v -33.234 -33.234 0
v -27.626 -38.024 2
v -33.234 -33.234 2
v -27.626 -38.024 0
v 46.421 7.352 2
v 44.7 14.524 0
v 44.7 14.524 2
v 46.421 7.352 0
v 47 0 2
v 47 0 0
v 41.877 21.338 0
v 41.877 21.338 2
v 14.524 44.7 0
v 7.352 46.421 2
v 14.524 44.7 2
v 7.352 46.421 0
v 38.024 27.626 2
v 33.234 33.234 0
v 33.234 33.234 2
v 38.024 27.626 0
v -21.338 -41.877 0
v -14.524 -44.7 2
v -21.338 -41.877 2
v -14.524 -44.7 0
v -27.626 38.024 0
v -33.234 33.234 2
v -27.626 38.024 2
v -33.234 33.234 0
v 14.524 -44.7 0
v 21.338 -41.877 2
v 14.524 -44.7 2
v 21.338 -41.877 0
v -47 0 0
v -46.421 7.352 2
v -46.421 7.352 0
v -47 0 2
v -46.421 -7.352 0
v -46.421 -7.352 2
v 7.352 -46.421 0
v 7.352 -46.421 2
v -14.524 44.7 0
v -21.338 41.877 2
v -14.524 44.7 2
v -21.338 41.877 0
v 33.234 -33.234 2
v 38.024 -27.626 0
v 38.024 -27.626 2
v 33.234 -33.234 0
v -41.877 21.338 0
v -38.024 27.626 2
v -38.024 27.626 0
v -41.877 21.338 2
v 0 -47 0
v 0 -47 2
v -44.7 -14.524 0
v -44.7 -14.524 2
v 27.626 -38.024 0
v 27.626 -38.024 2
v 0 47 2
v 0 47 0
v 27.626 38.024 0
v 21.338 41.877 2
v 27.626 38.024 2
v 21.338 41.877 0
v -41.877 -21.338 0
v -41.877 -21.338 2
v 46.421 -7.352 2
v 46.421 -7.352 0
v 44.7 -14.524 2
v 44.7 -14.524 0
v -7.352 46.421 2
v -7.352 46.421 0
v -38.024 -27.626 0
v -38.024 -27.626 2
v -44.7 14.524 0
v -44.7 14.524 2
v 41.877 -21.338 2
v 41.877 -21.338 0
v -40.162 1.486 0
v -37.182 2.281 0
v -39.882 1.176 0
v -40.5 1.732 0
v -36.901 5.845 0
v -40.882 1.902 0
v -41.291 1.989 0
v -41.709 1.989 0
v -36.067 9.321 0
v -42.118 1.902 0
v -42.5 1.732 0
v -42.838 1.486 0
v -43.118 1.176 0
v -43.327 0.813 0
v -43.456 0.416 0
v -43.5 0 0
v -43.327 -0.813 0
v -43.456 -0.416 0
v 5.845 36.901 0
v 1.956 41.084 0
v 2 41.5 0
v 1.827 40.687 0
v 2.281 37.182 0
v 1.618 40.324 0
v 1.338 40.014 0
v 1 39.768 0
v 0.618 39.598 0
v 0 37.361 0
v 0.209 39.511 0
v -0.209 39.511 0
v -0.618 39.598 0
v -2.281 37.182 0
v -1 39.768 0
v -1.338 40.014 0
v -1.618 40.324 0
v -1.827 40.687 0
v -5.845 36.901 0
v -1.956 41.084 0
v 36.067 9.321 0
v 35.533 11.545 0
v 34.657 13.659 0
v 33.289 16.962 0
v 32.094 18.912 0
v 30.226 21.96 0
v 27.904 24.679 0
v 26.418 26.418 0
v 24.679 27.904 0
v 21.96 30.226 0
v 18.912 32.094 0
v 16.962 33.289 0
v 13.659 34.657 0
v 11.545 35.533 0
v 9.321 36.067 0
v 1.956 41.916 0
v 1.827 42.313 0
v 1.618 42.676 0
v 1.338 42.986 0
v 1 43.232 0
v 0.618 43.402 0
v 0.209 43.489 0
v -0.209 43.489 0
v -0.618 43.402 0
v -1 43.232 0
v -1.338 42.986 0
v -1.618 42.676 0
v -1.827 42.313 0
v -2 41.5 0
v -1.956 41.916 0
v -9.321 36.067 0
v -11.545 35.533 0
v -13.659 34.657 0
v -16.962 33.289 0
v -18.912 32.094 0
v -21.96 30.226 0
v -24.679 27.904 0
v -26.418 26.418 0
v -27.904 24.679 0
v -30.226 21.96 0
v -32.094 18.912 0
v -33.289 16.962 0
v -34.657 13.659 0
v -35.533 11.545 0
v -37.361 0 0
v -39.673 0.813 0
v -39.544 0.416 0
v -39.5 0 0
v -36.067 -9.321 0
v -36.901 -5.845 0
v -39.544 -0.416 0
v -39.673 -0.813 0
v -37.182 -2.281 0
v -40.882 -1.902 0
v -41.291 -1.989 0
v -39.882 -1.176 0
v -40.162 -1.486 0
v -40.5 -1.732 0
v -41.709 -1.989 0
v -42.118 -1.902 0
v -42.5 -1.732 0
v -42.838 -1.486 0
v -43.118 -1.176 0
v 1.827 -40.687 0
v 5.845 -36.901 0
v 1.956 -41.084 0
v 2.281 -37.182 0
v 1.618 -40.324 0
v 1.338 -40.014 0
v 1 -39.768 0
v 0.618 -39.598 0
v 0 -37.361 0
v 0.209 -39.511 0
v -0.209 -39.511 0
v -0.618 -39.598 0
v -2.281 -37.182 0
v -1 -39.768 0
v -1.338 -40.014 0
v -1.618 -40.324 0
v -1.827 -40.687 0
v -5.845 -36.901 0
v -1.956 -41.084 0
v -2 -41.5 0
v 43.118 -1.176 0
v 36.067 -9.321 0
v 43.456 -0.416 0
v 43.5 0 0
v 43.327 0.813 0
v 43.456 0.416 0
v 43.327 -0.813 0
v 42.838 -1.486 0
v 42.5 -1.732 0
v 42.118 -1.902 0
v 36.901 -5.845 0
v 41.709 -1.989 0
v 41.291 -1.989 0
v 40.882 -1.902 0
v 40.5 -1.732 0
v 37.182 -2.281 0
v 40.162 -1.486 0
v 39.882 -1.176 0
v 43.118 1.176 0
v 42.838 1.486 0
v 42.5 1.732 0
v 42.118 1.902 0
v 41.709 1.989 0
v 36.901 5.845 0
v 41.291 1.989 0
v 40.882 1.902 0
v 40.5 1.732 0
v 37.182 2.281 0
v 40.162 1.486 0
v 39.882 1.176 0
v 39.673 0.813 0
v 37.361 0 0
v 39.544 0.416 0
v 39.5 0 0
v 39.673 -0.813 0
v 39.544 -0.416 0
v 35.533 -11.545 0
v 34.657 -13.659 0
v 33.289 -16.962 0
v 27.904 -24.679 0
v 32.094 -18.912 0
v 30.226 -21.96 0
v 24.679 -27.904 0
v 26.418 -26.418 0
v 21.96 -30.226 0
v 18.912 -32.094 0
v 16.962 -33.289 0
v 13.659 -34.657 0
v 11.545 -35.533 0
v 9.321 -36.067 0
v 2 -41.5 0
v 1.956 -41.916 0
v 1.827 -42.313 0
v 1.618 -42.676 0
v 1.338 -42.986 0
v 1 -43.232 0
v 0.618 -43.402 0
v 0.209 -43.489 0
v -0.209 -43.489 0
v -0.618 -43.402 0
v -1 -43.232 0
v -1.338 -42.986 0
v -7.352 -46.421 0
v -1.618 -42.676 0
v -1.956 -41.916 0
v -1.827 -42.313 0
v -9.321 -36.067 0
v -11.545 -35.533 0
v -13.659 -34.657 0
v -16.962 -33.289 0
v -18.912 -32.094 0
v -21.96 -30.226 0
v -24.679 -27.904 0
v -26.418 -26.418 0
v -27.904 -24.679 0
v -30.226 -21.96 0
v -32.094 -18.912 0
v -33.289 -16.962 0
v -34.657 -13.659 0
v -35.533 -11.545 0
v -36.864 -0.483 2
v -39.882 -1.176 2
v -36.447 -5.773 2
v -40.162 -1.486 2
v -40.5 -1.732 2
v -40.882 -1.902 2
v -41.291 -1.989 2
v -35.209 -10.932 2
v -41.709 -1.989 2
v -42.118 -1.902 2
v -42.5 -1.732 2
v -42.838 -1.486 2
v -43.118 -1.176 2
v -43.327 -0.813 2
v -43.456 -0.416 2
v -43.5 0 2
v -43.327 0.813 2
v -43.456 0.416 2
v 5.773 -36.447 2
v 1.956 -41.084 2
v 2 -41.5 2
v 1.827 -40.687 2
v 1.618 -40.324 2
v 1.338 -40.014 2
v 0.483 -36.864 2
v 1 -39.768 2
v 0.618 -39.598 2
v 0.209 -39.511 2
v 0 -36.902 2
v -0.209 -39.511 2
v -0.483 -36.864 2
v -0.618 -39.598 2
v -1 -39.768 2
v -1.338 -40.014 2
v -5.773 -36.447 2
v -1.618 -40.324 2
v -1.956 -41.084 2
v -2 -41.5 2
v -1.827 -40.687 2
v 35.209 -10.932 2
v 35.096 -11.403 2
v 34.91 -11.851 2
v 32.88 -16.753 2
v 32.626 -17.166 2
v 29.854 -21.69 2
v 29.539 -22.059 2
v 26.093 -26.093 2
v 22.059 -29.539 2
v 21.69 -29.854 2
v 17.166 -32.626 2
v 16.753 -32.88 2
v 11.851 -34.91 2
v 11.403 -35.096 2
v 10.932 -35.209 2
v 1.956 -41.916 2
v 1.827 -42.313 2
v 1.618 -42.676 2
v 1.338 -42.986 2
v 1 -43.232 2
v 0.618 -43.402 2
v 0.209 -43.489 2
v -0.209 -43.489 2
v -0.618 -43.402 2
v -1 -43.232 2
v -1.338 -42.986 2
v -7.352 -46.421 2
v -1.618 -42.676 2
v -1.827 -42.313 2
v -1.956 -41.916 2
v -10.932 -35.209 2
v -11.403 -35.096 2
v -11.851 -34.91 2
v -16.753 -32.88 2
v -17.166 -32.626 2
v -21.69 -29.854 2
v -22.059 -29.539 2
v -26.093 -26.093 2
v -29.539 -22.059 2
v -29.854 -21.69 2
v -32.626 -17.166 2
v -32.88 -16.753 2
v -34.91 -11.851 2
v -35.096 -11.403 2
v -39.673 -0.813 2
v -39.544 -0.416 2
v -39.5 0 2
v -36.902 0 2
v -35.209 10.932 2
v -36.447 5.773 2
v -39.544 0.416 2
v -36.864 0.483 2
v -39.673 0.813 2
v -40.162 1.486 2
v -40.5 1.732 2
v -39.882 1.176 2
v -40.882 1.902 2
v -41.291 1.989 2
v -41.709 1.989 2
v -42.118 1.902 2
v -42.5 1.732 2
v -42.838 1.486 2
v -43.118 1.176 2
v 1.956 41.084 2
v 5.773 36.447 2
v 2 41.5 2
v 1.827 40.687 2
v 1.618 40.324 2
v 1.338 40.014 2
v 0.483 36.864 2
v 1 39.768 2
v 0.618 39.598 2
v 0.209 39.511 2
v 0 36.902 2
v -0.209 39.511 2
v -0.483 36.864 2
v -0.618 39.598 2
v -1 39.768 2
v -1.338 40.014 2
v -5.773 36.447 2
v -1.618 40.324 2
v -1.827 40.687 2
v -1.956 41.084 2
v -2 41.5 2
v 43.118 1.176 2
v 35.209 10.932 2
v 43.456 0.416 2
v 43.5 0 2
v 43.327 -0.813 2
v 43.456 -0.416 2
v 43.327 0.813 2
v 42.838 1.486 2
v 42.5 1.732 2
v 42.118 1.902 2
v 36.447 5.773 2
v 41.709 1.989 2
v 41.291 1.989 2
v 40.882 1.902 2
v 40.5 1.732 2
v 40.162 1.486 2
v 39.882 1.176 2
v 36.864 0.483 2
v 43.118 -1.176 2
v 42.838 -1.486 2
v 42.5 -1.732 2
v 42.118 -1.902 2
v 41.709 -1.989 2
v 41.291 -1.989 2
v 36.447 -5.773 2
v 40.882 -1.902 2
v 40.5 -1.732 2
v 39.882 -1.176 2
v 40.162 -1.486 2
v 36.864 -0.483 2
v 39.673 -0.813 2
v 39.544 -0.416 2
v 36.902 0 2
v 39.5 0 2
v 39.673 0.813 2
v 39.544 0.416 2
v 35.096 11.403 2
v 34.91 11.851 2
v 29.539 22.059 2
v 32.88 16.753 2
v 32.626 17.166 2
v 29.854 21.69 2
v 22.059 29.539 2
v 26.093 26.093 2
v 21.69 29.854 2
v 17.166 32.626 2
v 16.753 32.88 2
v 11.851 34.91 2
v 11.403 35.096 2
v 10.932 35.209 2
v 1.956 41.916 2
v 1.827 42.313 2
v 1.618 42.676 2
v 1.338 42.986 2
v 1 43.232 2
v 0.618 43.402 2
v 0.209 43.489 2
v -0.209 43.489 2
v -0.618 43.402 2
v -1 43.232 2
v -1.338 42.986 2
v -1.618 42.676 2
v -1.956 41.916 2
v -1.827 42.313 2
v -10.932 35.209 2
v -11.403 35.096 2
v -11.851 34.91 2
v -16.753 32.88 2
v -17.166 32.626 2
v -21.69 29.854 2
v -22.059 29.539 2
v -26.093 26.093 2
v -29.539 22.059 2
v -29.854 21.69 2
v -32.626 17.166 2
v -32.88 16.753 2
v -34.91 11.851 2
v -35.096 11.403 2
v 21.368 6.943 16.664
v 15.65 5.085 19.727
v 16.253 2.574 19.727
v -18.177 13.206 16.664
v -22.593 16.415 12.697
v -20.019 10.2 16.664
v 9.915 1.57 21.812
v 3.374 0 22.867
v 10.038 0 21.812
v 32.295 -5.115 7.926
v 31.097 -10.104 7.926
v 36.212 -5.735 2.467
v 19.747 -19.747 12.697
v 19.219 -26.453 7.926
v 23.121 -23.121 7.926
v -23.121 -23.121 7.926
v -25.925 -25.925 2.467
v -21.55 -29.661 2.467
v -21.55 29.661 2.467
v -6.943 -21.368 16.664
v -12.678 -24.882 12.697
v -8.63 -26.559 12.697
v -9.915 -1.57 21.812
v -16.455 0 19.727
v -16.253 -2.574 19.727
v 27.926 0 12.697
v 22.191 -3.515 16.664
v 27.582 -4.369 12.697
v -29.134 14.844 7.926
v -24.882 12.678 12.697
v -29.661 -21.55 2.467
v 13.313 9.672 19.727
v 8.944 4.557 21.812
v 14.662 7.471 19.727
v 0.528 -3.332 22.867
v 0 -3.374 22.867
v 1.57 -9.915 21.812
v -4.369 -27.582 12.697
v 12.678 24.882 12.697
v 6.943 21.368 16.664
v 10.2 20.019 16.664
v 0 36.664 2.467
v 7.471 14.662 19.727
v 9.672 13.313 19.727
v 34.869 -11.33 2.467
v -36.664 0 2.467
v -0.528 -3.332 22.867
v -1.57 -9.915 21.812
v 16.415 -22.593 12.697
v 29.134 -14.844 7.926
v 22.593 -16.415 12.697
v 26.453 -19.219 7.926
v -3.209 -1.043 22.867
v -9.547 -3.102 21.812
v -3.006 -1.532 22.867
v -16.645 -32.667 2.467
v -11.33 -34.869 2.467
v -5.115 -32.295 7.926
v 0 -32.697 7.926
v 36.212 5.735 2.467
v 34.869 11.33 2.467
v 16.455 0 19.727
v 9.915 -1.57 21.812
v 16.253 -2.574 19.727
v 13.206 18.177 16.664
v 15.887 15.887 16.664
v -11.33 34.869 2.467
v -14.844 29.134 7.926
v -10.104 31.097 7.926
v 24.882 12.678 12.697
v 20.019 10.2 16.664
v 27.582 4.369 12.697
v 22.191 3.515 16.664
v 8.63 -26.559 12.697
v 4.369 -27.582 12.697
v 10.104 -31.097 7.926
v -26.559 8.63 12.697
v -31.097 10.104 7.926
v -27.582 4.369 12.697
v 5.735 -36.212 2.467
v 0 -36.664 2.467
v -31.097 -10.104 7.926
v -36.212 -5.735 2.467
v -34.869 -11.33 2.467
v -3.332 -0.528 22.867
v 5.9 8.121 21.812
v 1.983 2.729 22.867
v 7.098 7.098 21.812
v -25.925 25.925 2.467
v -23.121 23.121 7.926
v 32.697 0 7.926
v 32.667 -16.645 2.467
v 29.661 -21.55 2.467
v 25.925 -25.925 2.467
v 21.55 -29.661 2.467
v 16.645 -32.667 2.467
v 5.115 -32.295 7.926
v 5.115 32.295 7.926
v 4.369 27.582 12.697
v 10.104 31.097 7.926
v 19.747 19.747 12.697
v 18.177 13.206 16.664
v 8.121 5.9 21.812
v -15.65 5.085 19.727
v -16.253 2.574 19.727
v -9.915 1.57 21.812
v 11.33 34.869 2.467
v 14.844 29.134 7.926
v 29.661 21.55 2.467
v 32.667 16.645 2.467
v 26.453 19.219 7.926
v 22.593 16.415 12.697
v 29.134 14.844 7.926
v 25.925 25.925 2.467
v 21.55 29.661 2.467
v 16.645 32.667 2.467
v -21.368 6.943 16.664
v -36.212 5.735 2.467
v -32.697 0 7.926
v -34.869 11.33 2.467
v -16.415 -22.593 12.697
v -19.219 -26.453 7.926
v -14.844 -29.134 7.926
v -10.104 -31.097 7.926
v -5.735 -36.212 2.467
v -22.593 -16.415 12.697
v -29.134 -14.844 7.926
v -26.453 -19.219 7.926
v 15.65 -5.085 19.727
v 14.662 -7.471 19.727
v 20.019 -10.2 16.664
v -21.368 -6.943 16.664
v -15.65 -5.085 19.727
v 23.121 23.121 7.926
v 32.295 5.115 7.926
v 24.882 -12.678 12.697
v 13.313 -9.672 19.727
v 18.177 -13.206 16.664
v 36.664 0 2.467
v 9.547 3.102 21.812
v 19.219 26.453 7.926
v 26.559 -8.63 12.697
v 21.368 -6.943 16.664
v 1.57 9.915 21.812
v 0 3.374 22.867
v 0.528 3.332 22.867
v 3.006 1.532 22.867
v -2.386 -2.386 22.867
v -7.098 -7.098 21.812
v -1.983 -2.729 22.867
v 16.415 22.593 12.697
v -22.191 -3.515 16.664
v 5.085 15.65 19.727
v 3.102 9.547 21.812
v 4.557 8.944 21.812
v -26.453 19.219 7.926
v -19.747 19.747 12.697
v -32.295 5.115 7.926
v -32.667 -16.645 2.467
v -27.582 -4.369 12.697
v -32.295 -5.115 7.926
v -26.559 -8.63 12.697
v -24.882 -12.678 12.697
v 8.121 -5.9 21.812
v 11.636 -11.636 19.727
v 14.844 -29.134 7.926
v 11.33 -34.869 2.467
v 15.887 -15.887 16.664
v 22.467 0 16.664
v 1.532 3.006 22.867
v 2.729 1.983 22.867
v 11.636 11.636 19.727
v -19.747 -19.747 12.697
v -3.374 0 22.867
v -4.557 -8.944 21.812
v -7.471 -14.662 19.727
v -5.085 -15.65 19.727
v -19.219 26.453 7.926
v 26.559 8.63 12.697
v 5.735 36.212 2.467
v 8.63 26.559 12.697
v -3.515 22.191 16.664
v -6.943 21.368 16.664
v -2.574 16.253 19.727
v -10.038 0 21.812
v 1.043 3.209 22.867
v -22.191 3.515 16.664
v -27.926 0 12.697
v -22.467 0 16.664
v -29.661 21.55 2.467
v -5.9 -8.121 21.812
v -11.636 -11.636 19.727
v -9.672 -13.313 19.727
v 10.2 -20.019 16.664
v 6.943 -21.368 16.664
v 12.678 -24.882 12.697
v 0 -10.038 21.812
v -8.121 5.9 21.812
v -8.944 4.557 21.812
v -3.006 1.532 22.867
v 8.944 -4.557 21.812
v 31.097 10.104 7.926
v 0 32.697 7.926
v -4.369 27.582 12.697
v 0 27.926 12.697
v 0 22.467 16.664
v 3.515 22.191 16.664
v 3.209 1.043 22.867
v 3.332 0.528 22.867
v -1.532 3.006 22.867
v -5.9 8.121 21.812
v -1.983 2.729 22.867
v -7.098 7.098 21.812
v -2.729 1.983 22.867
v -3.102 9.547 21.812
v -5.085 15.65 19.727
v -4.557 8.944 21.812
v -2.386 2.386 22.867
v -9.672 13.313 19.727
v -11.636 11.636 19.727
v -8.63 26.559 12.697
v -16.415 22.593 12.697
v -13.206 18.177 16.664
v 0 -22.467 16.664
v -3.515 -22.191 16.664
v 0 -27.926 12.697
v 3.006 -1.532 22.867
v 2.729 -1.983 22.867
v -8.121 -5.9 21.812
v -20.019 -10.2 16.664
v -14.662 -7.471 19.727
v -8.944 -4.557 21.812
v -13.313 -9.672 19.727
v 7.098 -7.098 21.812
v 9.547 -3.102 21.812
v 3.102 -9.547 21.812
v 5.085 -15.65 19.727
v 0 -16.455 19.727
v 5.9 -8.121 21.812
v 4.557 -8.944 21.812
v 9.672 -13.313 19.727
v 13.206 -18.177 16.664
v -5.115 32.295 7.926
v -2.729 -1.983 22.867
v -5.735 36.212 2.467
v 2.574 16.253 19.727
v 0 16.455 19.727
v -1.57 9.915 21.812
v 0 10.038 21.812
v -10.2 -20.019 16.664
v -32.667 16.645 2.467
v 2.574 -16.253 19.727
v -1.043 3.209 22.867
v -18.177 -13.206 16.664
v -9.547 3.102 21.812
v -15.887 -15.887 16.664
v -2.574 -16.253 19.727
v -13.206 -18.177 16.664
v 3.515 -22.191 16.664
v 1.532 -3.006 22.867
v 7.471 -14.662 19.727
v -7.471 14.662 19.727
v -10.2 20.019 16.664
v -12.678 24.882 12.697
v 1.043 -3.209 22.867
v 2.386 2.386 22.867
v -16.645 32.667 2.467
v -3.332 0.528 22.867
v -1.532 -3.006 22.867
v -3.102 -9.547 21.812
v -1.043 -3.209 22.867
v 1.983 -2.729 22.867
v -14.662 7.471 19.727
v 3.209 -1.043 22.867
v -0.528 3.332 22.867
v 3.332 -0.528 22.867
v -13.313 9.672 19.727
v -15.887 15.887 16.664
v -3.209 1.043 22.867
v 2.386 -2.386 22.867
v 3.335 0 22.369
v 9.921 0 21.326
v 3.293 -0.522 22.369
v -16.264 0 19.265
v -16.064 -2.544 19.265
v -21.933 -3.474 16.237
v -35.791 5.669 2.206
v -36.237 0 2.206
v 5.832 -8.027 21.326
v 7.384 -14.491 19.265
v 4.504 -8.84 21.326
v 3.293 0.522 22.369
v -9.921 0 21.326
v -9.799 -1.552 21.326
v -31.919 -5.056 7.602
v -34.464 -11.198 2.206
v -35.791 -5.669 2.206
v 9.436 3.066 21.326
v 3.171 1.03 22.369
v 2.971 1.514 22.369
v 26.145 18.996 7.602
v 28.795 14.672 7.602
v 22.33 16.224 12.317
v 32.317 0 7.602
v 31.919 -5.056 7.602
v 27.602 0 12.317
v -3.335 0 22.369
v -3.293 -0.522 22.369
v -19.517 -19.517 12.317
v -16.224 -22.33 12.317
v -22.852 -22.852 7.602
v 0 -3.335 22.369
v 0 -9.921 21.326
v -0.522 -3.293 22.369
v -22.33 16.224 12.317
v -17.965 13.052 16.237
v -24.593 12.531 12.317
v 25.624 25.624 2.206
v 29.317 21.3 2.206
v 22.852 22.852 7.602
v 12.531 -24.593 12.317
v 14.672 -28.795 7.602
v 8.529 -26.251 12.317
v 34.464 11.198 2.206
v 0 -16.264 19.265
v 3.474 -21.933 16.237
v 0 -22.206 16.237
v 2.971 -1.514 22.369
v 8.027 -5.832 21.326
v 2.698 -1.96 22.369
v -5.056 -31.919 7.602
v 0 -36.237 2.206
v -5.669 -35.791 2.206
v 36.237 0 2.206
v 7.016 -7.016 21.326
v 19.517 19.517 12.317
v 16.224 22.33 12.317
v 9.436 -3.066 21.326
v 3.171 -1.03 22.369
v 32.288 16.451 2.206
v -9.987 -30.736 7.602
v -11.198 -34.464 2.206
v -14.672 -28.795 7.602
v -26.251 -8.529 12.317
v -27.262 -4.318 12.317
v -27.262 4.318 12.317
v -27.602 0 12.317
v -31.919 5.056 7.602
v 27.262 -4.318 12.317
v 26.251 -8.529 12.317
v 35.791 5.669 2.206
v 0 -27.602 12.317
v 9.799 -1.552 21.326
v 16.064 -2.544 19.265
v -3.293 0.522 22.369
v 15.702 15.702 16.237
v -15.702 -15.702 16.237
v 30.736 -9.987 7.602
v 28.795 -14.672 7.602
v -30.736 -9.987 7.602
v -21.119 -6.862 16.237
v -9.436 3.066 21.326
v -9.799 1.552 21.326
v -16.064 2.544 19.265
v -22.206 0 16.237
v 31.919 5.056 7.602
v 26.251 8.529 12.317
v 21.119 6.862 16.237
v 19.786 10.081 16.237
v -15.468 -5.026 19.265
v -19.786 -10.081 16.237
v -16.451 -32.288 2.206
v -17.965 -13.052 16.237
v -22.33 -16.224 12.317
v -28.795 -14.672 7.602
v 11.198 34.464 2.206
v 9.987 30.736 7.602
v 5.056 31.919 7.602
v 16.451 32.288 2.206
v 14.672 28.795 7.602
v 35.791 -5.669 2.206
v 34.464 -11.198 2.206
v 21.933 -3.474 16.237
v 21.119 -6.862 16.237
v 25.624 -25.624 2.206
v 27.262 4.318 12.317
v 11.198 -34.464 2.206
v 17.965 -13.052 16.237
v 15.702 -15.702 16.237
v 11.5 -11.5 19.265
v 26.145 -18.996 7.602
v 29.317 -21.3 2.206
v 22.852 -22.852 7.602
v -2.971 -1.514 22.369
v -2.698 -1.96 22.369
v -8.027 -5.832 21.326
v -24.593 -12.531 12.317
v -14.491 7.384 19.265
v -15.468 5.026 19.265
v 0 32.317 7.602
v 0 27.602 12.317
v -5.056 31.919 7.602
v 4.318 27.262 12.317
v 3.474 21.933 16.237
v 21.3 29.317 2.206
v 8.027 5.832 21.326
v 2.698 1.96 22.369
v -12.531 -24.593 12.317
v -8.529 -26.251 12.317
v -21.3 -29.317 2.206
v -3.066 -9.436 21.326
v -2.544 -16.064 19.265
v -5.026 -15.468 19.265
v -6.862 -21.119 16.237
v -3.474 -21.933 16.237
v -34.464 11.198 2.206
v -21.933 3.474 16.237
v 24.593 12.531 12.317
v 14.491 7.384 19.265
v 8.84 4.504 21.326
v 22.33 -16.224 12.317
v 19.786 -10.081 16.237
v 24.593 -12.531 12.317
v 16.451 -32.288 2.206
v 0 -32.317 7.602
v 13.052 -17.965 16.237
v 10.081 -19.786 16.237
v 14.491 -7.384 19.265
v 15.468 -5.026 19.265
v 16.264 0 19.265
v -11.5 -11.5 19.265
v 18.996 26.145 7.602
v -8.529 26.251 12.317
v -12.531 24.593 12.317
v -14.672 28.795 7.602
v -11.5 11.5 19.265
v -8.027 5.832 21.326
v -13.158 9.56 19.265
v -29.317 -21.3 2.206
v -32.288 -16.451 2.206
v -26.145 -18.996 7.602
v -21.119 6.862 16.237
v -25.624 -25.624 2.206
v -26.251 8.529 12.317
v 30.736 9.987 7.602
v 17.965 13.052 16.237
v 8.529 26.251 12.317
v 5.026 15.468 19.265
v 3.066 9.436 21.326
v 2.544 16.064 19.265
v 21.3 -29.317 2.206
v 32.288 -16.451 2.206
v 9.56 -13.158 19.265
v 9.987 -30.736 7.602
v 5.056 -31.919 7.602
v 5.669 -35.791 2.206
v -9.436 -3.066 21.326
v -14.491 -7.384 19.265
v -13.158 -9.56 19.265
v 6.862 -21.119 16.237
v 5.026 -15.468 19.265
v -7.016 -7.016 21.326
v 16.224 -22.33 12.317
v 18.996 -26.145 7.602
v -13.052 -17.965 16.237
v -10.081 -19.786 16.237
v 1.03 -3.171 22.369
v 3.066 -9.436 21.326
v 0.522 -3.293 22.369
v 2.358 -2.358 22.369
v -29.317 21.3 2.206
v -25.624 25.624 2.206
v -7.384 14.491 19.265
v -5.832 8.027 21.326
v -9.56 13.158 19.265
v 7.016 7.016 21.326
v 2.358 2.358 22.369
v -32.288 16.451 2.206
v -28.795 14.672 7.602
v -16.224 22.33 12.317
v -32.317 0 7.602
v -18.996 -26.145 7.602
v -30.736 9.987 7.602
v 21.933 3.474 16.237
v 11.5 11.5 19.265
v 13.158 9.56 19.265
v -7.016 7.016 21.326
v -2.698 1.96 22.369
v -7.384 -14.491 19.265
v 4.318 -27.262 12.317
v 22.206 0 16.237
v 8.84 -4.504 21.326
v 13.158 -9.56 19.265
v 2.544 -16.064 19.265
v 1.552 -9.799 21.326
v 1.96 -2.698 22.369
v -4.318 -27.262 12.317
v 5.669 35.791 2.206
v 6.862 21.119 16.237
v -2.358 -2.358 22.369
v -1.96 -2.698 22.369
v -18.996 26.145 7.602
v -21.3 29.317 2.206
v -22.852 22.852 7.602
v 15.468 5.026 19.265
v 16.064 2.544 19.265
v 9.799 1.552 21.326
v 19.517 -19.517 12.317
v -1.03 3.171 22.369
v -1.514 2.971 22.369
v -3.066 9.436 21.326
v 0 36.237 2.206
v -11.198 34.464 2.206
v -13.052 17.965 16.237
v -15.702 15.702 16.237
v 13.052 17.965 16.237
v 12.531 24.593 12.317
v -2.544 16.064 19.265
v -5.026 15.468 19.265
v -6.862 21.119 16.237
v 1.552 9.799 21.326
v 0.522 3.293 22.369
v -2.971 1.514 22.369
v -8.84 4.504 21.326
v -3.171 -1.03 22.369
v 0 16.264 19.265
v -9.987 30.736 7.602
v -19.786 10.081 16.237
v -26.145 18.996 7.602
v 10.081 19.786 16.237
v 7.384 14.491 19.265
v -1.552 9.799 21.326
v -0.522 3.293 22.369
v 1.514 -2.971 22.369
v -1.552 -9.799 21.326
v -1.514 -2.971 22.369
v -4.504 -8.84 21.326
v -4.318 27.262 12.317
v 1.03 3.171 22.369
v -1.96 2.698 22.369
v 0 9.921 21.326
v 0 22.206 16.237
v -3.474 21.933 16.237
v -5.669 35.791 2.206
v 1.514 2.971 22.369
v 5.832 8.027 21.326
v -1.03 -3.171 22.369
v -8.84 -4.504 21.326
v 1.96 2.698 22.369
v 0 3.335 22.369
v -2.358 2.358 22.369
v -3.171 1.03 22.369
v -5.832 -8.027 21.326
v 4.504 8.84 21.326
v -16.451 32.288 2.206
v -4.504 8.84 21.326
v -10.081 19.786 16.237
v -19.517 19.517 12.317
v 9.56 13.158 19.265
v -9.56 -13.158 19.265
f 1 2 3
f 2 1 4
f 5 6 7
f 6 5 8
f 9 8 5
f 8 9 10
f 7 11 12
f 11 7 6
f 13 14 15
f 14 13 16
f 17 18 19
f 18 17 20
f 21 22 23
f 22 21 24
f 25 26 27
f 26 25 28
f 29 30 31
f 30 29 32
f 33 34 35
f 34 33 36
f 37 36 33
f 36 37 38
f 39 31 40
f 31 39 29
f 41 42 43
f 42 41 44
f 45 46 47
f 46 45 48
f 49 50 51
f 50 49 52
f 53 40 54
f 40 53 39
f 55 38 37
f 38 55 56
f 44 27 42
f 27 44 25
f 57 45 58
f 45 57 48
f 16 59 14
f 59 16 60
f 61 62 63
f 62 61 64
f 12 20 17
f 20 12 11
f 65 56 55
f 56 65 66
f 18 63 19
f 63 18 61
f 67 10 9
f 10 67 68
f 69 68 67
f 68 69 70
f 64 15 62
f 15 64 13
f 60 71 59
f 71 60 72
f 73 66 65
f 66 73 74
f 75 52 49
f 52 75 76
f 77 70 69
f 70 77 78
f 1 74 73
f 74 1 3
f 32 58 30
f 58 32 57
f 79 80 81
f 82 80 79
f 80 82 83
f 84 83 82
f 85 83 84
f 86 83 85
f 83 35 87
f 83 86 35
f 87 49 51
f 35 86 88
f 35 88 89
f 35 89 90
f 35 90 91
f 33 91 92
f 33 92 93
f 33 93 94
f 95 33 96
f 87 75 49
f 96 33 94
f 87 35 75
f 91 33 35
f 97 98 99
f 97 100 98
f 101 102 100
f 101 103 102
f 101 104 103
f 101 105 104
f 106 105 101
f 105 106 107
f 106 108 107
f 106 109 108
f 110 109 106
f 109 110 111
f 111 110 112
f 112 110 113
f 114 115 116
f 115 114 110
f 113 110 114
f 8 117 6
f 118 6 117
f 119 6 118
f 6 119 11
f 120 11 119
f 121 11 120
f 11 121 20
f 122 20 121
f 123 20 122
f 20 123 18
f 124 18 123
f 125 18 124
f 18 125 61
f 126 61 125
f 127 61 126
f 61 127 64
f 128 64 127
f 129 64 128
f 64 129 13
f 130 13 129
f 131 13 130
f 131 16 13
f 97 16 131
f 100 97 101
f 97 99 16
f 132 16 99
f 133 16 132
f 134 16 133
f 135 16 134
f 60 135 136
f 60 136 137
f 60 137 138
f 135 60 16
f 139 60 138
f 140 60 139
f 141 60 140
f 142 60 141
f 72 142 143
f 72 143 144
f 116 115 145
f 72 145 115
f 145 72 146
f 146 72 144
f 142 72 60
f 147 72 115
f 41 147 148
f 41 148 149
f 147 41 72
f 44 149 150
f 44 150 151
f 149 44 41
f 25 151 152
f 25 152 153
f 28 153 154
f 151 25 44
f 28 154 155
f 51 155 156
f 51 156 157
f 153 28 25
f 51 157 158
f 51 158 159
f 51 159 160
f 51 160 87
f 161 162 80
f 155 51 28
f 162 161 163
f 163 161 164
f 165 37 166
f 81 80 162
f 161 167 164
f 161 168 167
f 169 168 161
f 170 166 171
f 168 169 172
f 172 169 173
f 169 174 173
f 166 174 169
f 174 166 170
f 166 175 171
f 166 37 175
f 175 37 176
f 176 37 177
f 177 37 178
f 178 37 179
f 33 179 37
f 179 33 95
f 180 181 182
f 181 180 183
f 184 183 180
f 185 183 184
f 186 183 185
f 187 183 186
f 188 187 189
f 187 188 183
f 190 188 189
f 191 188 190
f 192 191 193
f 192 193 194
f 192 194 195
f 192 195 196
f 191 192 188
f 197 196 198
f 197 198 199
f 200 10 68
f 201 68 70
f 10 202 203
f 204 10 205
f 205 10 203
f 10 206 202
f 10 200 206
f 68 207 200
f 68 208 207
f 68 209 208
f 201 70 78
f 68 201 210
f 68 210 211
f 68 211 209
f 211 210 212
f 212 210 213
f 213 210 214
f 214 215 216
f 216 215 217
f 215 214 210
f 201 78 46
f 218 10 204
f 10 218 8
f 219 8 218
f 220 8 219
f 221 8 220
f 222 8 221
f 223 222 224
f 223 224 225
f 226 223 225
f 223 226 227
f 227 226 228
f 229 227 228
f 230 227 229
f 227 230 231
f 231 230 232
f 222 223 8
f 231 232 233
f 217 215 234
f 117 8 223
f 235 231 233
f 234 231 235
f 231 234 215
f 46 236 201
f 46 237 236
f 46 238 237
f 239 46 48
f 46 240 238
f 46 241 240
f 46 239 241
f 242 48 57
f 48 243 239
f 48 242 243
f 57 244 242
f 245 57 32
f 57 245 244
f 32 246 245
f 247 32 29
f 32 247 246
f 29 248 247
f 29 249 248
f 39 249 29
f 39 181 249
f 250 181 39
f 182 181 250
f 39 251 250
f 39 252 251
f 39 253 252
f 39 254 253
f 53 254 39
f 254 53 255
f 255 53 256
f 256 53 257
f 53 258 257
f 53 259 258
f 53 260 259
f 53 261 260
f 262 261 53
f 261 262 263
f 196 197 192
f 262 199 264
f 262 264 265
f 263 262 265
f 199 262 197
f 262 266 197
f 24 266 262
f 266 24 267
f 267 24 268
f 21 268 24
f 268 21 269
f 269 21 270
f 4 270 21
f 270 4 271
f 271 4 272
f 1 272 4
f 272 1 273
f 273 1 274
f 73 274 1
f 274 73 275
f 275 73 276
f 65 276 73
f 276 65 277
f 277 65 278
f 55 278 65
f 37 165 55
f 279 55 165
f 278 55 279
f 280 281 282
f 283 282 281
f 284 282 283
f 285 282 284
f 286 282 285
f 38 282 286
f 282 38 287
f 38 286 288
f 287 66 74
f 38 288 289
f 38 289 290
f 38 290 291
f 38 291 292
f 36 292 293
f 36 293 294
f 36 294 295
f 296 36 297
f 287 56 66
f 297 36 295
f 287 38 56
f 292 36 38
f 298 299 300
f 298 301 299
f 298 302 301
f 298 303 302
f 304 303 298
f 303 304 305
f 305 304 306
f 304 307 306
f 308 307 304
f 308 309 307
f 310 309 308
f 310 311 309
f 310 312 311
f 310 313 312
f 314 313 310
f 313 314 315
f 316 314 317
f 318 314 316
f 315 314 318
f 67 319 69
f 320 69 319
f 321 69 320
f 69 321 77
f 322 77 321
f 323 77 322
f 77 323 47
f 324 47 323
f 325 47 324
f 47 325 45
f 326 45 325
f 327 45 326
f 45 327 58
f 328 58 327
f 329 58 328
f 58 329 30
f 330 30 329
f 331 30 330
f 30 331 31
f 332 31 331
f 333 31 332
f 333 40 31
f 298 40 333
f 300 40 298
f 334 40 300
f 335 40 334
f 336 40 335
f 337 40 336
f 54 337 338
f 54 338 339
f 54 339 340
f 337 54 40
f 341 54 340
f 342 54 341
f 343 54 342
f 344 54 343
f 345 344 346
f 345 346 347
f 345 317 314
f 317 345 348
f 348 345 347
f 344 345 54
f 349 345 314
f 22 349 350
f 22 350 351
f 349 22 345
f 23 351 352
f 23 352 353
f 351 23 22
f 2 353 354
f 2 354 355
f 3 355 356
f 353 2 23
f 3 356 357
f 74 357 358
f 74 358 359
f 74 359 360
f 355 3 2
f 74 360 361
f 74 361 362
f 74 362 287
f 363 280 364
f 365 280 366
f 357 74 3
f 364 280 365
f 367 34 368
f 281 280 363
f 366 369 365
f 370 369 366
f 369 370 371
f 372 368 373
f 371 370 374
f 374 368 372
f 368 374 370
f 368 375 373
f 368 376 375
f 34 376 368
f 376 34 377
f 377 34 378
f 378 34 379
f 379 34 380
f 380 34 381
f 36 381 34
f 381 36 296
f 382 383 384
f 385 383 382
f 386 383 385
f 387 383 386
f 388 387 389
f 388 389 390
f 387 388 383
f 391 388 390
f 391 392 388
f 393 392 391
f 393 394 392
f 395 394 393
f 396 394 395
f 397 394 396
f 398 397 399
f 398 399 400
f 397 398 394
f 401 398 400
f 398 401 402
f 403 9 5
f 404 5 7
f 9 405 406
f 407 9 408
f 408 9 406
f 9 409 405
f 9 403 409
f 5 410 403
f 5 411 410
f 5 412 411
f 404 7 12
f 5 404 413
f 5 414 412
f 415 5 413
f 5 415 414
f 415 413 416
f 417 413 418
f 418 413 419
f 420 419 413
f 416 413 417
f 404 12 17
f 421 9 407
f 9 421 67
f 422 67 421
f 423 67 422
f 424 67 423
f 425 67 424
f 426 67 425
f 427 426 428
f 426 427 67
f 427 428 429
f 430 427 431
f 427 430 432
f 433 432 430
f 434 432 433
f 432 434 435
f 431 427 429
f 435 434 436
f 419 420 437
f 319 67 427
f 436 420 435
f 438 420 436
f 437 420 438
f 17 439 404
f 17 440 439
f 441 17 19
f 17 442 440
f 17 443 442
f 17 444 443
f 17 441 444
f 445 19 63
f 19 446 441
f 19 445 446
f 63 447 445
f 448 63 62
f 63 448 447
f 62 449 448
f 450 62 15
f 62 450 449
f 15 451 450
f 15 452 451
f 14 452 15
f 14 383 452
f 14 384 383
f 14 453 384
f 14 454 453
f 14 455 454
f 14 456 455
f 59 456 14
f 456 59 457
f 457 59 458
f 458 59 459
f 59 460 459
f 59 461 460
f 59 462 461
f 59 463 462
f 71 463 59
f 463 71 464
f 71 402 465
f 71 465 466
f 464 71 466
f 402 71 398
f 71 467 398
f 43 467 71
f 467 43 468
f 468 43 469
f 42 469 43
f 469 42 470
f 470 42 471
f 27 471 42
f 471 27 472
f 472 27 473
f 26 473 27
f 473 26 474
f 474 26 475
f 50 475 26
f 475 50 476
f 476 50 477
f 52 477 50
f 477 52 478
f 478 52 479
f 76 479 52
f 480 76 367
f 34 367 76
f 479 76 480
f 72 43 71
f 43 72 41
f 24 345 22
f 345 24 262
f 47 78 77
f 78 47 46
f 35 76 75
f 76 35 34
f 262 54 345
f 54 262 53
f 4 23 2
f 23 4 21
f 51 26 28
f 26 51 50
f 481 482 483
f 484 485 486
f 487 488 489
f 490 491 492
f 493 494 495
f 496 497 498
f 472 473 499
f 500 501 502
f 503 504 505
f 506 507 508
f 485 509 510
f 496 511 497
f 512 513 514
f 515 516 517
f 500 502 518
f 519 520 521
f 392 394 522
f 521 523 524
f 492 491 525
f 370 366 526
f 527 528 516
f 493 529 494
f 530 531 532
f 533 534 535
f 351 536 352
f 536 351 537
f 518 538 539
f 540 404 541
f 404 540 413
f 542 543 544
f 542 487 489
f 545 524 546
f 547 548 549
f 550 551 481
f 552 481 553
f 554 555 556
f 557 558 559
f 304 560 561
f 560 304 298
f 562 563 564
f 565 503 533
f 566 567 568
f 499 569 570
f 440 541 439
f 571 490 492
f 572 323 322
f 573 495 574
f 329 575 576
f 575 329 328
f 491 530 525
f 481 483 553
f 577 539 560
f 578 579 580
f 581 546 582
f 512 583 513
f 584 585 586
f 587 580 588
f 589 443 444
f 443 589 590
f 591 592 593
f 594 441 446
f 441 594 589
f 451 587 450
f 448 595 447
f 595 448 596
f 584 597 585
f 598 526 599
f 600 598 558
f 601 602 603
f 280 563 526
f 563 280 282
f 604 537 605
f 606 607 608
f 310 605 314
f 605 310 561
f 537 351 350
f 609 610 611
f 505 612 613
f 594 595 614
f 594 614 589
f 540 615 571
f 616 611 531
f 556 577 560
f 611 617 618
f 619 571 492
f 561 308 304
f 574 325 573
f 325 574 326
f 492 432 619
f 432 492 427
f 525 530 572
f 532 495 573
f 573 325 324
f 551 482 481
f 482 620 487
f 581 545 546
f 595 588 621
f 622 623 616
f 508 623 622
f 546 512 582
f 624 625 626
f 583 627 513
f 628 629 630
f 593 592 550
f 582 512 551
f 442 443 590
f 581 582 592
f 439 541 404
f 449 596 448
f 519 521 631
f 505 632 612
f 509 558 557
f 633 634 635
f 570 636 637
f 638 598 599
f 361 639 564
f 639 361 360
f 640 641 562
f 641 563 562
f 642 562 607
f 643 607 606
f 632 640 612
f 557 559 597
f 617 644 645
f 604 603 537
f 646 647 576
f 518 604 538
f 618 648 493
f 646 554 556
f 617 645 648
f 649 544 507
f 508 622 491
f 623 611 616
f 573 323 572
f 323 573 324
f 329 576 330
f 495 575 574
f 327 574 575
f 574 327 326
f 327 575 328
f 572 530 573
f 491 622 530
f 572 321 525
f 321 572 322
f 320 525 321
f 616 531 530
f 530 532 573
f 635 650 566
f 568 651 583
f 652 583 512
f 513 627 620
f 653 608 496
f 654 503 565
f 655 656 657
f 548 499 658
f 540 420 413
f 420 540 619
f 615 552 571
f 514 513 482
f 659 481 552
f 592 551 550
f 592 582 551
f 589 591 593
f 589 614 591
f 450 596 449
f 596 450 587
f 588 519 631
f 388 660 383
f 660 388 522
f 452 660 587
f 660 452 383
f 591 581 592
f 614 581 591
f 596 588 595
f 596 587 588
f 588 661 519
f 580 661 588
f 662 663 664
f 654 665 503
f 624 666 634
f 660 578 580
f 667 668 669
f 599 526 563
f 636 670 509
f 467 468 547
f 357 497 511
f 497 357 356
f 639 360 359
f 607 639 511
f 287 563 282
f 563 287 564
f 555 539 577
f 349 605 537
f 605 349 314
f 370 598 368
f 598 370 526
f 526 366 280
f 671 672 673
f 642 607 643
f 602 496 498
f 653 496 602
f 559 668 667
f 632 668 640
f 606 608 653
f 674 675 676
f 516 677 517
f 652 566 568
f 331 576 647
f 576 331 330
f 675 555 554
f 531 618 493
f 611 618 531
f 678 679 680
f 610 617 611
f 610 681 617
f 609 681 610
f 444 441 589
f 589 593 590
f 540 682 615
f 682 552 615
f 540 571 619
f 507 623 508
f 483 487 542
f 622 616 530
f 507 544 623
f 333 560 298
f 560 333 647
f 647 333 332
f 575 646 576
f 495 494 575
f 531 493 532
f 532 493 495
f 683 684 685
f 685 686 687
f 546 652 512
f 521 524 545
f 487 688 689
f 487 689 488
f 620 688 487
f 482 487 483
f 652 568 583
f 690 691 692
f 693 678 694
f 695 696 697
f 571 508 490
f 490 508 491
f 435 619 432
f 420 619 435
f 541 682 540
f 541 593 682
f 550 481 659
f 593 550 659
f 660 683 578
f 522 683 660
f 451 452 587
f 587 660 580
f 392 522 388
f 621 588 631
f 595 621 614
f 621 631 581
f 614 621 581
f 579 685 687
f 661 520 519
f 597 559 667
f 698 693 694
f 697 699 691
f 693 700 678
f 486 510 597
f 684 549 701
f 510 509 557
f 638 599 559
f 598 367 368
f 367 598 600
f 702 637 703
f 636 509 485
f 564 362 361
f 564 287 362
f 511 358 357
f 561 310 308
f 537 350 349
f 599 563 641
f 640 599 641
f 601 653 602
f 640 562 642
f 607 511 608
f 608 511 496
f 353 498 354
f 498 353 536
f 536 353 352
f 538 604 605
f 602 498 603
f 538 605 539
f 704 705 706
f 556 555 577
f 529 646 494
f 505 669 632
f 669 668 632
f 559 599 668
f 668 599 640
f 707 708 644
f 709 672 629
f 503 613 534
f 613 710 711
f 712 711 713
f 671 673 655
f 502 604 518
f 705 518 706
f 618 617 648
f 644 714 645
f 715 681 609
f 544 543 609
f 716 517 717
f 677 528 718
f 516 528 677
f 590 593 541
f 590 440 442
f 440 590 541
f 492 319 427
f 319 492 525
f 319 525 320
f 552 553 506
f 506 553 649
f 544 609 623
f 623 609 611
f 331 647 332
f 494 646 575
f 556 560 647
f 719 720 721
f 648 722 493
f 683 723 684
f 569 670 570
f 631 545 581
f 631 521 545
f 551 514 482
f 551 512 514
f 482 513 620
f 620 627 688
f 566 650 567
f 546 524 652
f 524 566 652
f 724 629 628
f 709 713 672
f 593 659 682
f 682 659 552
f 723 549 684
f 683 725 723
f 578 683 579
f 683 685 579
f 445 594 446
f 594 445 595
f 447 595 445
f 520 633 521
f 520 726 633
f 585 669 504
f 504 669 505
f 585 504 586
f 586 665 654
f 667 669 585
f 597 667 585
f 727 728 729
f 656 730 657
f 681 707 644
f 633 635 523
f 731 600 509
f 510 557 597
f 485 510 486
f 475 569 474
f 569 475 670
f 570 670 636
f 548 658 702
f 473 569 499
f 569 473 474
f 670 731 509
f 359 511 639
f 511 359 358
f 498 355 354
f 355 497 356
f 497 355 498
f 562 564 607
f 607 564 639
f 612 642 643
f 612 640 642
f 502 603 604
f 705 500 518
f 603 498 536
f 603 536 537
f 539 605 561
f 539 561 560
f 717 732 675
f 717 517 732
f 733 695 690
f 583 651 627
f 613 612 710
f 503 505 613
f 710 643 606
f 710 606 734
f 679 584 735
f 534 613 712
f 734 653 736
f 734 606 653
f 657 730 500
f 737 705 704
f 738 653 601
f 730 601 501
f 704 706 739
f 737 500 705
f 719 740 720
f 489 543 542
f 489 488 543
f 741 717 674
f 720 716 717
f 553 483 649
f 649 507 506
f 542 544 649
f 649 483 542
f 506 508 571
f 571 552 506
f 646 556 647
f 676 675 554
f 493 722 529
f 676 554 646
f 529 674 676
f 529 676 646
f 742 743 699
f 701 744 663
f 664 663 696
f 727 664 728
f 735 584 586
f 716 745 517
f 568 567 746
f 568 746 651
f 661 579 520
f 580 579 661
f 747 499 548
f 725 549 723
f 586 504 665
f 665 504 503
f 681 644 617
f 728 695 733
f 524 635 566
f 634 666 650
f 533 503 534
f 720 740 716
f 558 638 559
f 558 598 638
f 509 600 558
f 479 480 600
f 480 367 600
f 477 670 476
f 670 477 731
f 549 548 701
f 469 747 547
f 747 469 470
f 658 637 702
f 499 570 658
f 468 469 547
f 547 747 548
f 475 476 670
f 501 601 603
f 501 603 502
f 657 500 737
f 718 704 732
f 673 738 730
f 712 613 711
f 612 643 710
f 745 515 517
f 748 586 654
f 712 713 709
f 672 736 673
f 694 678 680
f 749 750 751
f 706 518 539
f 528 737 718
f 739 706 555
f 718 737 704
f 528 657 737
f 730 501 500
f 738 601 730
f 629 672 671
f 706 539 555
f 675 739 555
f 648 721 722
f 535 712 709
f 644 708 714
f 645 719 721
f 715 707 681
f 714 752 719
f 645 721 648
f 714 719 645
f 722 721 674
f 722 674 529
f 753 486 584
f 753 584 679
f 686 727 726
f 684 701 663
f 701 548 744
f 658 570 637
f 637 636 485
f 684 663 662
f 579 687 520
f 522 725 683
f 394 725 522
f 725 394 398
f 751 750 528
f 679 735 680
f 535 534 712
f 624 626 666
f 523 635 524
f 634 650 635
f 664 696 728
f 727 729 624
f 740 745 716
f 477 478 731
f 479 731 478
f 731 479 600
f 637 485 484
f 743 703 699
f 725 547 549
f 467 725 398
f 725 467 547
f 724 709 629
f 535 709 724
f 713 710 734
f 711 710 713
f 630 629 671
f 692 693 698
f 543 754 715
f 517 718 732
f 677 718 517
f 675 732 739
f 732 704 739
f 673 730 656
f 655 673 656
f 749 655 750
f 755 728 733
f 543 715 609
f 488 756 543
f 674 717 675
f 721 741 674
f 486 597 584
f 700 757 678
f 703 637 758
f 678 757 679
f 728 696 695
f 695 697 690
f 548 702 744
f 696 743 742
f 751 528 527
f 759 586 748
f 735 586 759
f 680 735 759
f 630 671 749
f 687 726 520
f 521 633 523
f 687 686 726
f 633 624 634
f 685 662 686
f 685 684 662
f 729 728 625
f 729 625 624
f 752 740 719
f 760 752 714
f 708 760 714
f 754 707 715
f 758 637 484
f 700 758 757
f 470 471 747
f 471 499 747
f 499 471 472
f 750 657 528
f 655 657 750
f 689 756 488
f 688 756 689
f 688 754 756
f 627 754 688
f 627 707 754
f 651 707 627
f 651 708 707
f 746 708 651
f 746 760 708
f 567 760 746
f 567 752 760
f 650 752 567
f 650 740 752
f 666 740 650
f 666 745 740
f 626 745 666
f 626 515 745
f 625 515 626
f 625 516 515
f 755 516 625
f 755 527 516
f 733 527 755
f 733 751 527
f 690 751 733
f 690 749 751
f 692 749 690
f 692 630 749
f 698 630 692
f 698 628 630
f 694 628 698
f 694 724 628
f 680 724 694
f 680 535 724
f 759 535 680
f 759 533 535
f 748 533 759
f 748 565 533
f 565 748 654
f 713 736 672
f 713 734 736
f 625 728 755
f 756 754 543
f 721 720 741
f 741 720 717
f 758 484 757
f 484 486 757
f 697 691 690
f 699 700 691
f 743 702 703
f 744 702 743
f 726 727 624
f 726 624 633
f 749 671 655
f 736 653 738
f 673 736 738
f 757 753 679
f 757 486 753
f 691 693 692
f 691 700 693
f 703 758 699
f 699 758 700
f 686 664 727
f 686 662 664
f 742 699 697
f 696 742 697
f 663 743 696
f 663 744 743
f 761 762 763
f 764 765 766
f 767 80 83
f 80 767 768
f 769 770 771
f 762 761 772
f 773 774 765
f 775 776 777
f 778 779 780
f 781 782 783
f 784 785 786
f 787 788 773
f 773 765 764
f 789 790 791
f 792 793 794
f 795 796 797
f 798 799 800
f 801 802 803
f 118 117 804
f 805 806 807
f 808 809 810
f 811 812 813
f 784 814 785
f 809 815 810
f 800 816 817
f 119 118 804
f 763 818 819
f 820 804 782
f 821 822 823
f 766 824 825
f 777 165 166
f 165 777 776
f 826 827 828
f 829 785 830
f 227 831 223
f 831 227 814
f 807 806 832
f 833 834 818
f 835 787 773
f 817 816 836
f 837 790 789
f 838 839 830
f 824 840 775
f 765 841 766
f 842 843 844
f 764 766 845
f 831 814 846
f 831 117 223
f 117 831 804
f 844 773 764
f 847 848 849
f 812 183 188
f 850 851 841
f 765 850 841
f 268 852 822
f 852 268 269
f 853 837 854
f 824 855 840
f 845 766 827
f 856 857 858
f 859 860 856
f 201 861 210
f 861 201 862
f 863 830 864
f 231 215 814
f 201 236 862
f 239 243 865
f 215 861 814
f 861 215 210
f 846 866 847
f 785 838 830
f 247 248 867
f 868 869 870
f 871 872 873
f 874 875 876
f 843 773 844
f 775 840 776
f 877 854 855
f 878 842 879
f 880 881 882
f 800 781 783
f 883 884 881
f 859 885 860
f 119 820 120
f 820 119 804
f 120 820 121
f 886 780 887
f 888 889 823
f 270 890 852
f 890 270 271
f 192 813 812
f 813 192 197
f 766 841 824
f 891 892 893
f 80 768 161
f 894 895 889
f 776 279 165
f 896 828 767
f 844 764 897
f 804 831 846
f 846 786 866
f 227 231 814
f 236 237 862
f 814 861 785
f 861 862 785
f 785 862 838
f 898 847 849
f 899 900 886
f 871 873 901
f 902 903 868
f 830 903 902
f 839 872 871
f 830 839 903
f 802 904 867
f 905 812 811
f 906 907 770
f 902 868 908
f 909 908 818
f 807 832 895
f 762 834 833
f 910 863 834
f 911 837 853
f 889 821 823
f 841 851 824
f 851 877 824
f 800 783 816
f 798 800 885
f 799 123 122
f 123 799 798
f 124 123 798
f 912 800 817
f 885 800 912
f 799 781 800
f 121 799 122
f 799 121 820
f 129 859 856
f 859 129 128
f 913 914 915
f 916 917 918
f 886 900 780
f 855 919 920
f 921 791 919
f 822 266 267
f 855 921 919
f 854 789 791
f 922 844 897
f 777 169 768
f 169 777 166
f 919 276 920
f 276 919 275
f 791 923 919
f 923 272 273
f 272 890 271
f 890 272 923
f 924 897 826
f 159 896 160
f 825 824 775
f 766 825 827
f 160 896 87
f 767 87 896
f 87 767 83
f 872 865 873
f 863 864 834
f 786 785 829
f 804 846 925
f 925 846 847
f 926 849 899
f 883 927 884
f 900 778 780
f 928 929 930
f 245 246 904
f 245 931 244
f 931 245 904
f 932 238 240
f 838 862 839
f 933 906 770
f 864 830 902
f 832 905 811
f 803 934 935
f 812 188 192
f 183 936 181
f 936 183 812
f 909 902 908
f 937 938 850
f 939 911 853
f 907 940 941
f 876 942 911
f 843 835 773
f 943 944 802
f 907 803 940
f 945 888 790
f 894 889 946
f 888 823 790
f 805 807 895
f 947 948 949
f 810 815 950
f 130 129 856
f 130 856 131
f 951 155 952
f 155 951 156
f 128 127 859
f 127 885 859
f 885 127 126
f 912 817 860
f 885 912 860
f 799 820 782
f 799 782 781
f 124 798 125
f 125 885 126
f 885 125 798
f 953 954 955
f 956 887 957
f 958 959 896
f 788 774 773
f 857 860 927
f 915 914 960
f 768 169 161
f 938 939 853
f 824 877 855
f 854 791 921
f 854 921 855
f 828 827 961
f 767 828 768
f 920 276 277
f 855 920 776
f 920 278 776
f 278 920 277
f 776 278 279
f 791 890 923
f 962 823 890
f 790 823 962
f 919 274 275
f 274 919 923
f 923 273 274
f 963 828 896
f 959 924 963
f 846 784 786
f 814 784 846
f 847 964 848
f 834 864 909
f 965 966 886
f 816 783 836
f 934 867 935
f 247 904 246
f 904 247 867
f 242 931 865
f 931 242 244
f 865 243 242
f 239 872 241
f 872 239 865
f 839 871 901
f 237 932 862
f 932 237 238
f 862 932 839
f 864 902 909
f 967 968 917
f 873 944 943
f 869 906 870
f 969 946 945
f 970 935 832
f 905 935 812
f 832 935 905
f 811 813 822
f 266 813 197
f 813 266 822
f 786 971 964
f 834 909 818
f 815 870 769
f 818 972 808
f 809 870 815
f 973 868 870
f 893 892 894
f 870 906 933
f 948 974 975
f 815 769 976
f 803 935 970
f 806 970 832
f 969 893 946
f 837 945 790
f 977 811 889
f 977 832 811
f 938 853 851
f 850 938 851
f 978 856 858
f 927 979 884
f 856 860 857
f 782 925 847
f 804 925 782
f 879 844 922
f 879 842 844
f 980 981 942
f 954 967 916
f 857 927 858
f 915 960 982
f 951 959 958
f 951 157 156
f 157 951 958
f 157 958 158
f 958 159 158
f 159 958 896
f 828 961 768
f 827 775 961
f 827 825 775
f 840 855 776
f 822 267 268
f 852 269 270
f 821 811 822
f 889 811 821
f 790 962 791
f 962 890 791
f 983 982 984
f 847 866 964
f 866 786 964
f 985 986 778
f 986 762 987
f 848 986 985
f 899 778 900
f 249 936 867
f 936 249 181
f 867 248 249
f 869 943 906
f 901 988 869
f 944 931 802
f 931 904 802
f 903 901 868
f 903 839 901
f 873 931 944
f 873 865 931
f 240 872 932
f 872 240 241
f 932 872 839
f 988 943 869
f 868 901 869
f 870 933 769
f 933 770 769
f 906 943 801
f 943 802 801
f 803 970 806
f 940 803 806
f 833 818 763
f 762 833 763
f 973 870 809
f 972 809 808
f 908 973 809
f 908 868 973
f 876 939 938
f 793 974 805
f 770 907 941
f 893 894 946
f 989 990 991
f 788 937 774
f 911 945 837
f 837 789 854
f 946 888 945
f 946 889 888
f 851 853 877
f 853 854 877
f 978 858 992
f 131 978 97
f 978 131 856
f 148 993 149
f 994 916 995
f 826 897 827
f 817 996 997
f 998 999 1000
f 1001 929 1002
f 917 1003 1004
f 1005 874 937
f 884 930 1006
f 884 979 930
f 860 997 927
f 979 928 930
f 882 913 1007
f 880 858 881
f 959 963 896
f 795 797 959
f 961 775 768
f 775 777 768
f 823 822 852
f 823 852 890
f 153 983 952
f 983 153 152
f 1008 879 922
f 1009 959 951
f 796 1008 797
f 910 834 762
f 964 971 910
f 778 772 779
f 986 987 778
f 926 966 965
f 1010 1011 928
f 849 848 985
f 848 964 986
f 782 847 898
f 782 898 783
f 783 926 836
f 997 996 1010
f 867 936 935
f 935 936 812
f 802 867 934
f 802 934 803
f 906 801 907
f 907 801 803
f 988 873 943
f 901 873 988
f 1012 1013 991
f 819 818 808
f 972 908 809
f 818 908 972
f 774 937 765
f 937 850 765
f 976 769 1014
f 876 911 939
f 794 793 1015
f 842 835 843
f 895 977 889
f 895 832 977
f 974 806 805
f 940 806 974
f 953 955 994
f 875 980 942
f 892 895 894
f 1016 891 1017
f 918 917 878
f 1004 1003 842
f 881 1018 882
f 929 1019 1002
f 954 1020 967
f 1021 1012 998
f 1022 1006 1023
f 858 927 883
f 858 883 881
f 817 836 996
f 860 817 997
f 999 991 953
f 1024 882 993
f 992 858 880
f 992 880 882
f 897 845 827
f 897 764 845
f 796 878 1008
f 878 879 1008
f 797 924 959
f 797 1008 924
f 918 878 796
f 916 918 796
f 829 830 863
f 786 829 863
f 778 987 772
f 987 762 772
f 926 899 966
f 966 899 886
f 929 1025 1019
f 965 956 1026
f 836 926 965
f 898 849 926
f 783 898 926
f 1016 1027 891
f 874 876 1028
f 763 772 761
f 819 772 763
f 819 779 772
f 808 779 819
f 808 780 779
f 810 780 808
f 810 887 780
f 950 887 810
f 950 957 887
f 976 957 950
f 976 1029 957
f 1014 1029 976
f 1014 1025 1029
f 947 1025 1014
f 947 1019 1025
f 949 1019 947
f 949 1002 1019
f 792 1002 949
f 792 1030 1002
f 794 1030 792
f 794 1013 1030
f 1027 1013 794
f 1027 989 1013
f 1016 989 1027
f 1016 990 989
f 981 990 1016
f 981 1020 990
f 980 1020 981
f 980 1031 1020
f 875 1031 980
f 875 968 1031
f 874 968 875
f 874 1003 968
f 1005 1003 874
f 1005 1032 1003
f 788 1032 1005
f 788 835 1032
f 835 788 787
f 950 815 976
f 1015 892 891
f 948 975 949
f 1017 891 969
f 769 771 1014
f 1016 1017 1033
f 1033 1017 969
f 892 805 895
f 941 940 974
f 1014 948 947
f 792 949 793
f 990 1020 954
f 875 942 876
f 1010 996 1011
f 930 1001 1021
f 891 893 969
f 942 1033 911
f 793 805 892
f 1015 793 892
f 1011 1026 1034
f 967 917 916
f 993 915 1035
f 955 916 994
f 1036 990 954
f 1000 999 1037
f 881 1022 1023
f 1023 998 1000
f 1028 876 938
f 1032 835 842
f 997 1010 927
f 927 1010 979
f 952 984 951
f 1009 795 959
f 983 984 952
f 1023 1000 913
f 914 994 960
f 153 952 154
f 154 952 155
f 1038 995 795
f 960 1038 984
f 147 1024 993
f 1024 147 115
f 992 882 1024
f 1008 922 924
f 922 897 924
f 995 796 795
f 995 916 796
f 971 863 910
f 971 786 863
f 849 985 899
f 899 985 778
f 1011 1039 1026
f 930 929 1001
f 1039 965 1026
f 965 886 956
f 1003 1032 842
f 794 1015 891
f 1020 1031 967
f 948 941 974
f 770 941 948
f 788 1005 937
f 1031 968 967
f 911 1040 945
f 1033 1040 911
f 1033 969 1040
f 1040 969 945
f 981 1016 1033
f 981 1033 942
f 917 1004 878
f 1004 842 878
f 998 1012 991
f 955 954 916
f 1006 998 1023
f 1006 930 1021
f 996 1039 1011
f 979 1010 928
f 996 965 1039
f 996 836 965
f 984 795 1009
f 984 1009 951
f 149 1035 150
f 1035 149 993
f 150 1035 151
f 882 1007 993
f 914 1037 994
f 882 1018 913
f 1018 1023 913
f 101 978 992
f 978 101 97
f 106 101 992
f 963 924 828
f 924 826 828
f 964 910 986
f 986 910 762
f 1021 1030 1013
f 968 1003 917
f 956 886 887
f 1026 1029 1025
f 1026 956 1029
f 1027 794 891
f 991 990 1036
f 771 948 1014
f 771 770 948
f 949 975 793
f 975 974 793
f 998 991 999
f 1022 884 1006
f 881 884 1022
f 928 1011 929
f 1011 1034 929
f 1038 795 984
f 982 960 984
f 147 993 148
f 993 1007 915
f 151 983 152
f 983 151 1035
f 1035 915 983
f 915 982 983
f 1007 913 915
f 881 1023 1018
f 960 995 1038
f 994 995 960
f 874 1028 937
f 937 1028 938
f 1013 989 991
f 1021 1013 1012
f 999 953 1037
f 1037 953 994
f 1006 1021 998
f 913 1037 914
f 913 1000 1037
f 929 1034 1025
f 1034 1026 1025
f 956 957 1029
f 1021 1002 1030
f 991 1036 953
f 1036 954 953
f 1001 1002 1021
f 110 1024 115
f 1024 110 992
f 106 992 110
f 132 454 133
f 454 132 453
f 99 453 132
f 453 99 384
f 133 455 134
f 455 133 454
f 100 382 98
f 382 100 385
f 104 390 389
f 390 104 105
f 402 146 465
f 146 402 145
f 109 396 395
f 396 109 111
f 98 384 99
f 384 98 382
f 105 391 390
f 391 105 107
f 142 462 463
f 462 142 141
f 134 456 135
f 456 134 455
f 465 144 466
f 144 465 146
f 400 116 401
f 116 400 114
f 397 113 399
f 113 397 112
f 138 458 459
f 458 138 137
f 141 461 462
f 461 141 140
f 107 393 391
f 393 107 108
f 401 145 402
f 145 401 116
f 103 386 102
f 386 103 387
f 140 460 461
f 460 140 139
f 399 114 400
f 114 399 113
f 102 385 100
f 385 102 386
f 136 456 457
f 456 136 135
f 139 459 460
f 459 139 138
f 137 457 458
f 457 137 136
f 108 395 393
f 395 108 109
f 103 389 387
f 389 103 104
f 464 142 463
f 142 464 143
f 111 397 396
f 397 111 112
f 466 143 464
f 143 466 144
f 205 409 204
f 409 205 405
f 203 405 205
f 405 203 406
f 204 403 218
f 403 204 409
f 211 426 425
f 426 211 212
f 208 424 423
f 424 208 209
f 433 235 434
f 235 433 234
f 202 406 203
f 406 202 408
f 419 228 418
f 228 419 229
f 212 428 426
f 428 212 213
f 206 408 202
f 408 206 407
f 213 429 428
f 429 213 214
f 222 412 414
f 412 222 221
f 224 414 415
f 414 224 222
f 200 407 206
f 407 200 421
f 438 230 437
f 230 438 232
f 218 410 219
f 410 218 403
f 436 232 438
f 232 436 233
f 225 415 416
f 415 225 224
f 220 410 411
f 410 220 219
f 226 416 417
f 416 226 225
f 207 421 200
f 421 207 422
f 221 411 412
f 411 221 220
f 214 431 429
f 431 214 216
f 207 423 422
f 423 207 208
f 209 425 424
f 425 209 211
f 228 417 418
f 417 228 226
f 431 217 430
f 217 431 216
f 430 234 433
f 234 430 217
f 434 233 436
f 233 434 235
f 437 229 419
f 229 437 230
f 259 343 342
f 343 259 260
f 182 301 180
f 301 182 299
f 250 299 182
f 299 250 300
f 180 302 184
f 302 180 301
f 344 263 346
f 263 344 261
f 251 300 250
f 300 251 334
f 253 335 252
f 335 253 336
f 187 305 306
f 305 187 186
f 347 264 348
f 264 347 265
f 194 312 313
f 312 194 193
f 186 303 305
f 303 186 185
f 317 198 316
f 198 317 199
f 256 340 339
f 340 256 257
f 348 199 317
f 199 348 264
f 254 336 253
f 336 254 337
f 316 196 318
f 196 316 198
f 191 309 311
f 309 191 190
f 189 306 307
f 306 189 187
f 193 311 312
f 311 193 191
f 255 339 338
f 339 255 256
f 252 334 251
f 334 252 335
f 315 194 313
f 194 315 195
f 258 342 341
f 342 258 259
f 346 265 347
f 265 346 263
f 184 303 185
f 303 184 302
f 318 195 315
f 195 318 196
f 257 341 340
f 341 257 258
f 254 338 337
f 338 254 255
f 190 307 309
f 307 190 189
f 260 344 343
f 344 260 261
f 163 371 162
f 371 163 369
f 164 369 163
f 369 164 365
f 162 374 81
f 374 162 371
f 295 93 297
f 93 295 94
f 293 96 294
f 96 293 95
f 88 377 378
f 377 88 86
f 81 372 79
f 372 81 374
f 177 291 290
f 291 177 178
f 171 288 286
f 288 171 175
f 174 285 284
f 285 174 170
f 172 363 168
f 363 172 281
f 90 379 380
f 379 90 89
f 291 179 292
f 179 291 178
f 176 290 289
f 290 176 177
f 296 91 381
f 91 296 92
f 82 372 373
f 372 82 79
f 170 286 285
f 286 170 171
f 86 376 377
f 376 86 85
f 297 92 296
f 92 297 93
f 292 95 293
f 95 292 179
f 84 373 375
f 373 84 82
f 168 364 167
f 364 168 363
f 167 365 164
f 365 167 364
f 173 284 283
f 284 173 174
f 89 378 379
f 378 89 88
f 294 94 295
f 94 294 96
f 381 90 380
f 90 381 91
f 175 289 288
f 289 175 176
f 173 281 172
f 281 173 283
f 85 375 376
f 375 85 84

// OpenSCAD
module placa(hc1, dc1, fnc1, des1, fnes, hc2, des2){
    difference(){
        esferaHueca(des1, fnes, hc2, des2);
        translate([0,41.5,-2])
        cylinder (h = hc1, d=dc1, $fn=fnc1);
        translate([41.5,0,-2])
        cylinder (h = hc1, d=dc1, $fn=fnc1);
        translate([0,-41.5,-2])
        cylinder (h = hc1, d=dc1, $fn=fnc1);
        translate([-41.5,0,-2])
        cylinder (h = hc1, d=dc1, $fn=fnc1);
    }
} 

module esferaHueca(des1, fnes, hc2, des2){
    difference(){
        difference(){
           esfera(hc2, des2, fnes);
           translate([0,0,-20])
           sphere(d = des1, $fn = fnes); 
        }
    translate([0,0,-80])
    cylinder (h = 80, d=94, $fn=fnes);  
}
}

module esfera(hc2, des2, fnes){
    union(){
       difference(){
          cylinder (h = hc2, d=94, $fn=fnes);
          cylinder (h = hc2, d=64, $fn=fnes);
       }
       translate([0,0,-20])
       sphere(d = des2, $fn = fnes);
    }
}

placa(4, 4, 30, 85, 40, 2, 86);
